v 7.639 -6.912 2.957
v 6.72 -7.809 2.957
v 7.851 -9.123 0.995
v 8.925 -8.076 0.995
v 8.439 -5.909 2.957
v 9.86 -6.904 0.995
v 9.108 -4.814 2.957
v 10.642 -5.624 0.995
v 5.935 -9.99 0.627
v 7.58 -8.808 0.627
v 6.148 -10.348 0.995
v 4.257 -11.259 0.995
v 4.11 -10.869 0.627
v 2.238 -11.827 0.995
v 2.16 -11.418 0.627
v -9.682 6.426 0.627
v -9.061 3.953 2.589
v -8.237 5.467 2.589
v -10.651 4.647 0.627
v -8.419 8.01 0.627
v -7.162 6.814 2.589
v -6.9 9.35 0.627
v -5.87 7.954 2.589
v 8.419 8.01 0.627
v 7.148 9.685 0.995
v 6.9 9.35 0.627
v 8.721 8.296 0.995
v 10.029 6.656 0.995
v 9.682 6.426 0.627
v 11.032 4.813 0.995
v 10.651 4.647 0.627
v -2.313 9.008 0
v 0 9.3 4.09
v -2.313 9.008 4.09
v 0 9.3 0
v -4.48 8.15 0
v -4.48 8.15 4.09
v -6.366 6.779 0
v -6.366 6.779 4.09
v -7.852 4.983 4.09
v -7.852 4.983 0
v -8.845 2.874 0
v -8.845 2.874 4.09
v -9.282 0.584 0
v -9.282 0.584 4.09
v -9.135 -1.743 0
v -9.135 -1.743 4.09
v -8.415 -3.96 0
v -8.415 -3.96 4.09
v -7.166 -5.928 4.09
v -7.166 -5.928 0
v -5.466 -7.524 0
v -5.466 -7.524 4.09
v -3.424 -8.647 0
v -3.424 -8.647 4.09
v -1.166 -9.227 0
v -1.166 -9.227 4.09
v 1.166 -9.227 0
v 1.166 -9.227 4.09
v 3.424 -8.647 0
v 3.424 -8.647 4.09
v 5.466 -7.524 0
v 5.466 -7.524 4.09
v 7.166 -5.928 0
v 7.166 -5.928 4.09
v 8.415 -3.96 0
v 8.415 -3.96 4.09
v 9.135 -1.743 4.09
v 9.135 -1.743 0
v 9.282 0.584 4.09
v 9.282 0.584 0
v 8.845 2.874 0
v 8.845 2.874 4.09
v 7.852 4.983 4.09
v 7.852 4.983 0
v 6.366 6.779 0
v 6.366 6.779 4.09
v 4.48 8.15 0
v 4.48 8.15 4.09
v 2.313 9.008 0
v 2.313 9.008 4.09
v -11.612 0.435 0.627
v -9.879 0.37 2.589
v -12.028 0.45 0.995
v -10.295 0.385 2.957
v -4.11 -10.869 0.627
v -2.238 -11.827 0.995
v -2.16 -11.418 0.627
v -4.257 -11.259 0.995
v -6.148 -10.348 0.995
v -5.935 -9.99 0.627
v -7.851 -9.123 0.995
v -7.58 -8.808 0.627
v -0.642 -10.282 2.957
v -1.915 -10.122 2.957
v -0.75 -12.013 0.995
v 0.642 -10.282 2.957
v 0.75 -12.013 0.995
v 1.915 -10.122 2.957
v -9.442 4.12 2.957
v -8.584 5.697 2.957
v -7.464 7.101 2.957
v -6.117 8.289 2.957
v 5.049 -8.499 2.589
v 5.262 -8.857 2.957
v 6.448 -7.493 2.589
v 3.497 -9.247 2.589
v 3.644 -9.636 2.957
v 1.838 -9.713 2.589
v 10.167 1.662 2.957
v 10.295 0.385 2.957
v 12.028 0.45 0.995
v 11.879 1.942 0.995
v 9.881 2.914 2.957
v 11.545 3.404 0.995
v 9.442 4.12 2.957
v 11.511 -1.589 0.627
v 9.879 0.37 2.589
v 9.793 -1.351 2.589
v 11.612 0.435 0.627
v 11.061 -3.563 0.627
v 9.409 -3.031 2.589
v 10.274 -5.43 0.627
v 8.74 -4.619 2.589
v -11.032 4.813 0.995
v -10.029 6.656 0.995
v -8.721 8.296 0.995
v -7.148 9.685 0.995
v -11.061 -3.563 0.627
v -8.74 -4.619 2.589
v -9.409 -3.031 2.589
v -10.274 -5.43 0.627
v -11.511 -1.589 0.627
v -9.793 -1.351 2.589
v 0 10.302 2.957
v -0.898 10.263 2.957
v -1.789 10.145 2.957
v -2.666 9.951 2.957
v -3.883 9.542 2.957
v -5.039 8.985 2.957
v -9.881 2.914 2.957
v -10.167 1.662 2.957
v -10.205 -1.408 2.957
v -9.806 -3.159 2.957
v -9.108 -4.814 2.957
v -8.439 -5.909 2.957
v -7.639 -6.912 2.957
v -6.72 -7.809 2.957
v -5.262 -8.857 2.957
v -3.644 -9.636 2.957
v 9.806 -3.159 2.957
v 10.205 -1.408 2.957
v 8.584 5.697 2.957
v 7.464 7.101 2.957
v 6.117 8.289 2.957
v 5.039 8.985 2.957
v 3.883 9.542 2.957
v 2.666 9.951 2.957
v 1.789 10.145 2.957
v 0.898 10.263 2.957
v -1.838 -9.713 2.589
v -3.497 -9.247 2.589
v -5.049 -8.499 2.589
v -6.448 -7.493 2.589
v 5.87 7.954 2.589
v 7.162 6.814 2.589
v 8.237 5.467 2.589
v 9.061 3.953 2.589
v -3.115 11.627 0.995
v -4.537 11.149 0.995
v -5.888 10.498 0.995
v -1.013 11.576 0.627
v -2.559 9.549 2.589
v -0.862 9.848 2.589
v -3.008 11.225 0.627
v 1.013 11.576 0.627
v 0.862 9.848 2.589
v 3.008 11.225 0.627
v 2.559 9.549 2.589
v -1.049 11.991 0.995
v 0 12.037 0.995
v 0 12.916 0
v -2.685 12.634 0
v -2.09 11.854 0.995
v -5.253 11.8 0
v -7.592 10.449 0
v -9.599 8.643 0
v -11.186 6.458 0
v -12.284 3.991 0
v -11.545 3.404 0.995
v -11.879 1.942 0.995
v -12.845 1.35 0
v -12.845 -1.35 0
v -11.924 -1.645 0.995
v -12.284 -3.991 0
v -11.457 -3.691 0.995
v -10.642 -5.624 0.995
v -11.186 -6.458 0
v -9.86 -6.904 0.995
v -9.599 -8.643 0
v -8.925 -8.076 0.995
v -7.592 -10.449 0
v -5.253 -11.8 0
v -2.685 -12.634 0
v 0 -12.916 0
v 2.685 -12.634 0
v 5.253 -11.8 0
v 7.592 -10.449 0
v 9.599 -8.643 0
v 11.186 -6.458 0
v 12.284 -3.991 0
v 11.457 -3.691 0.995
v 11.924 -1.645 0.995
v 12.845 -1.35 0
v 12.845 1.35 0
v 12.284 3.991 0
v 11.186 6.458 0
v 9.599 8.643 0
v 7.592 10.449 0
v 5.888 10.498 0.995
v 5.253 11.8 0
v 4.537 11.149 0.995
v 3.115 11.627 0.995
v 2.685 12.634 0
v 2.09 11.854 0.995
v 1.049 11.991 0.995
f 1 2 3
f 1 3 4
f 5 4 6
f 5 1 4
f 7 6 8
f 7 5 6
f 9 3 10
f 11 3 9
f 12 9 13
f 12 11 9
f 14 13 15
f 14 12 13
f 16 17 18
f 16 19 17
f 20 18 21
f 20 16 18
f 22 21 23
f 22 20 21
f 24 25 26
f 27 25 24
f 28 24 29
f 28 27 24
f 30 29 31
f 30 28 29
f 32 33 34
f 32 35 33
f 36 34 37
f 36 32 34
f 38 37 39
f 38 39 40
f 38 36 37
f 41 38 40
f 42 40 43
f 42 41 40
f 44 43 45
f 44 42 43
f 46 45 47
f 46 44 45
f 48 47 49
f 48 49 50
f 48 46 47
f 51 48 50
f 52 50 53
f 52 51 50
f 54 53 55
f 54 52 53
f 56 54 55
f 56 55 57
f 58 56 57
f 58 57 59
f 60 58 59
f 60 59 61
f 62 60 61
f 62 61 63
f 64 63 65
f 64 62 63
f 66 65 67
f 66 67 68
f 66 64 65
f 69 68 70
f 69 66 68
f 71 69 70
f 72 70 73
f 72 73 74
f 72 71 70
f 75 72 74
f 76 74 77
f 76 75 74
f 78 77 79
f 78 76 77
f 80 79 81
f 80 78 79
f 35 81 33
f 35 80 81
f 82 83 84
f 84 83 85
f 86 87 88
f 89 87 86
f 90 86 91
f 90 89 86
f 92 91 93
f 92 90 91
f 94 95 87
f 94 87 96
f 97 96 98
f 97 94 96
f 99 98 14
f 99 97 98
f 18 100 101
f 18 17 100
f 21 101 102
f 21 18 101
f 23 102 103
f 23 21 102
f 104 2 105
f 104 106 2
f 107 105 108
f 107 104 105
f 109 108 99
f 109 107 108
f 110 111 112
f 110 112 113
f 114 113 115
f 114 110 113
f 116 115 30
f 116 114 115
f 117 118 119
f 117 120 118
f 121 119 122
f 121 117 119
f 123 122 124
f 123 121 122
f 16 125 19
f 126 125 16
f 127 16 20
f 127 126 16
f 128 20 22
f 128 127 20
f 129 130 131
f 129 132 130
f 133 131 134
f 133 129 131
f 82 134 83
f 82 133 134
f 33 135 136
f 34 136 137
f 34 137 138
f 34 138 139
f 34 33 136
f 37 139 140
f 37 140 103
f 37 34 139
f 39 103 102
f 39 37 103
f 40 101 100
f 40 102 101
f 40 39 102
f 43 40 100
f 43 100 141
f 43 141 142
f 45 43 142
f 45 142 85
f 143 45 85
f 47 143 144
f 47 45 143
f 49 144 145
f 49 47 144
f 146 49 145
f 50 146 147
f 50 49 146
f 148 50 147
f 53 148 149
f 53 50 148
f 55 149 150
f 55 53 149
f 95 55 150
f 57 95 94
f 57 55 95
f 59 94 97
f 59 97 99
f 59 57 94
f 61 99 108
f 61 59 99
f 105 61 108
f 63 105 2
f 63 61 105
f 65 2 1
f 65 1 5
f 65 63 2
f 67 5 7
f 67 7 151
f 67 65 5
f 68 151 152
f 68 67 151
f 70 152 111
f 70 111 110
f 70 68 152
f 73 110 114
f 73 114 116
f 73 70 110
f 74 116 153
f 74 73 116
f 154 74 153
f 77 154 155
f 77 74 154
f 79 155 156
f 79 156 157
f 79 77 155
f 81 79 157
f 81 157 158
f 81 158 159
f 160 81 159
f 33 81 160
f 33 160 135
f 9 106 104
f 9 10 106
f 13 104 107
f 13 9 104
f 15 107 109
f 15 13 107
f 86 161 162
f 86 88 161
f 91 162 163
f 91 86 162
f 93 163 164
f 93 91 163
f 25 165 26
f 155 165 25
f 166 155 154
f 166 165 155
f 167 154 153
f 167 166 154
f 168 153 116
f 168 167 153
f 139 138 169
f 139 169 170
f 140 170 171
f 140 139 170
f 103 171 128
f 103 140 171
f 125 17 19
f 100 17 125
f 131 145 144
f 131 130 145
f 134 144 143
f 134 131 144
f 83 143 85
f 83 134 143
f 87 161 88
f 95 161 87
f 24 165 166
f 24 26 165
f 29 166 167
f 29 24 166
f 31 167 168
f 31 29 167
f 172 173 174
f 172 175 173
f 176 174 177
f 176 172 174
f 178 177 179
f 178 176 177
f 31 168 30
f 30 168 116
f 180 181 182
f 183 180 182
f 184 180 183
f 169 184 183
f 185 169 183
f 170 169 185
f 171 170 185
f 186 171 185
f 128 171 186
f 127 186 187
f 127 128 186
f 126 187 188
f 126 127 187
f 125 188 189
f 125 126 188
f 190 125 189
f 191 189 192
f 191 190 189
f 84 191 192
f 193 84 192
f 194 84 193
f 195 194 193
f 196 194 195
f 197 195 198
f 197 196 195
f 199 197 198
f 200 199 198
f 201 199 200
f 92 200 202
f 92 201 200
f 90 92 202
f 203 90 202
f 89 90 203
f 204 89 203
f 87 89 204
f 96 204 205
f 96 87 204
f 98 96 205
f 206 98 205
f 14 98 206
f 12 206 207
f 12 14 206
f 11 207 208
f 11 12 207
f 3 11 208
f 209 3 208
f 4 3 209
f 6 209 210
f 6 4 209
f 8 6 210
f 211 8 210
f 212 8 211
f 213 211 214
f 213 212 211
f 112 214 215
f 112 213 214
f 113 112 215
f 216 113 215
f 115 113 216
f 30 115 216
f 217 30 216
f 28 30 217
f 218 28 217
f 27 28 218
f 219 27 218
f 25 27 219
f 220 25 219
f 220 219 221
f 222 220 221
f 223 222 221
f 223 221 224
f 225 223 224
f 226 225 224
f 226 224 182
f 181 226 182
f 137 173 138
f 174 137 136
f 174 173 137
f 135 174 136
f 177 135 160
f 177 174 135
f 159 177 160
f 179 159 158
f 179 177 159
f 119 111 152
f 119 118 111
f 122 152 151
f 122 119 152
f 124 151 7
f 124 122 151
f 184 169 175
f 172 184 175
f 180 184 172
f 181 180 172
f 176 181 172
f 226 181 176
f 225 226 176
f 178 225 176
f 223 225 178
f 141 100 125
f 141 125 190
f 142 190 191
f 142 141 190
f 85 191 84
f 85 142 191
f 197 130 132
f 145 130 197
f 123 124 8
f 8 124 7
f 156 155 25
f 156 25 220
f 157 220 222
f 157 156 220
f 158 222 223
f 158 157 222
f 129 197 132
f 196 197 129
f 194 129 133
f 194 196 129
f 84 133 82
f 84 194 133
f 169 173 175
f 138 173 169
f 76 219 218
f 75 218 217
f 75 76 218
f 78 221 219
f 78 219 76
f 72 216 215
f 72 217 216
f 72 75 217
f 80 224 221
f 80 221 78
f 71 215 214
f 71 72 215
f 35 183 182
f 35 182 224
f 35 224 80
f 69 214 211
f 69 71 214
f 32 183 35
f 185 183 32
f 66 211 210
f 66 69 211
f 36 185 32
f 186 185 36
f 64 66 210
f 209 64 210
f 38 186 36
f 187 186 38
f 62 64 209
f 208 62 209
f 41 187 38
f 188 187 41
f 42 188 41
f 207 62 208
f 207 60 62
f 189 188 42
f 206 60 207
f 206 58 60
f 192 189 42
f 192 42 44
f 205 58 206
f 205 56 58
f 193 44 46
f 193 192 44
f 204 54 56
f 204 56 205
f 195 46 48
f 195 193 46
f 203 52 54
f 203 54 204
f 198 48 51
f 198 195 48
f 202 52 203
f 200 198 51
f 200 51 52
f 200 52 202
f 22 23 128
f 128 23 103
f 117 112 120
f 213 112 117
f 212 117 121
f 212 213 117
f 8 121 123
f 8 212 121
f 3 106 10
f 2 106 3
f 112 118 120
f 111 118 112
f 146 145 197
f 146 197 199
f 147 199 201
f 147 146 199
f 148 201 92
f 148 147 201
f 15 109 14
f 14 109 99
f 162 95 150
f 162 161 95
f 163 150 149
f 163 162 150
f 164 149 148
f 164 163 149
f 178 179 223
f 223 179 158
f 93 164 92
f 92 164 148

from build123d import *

# Parameters (mm, degrees)
F2_ANGLE_BACK   = 15
F2_ANGLE        = 30
F2_COPIES_COUNT = 7


# Not quite as in the source:
# - a pattern or mirror of a feature is missing from the dataset's text; its kind, count and spacing are read off the source's solid


with BuildPart() as f1:
    # F0 (on Right) → F1 (revolve)
    with BuildSketch(Plane.YZ):
        Polygon((9.3, 4.0896662887), (9.3, 0), (12.9161745474, 0), (12.0366714414, 0.9946627731), (11.620462189, 0.6266412283), (9.8856947209, 2.5885542775), (10.3019039734, 2.9565758223), align=None)
        Polygon((11.620462189, 0.6266412283), (12.0366714414, 0.9946627731), (10.3019039734, 2.9565758223), (9.8856947209, 2.5885542775), align=None)
    revolve(axis=Axis((0, 0, 2.1812447902), (0, 0, 1)))

    # F0 (on Right) → F2 (revolve, cut)
    with BuildSketch(Plane.YZ, mode=Mode.PRIVATE) as f2_sk:
        Polygon((11.620462189, 0.6266412283), (12.0366714414, 0.9946627731), (10.3019039734, 2.9565758223), (9.8856947209, 2.5885542775), align=None)
    f2 = revolve(f2_sk.sketch.rotate(Axis((0, 0, 2.1812447902), (0, 0, -1)), -F2_ANGLE_BACK), axis=Axis((0, 0, 2.1812447902), (0, 0, -1)), revolution_arc=F2_ANGLE, mode=Mode.SUBTRACT)

    # F2_copies: F2 ×7 about axis
    f2_copies_axis = Axis((0, 0, 0), (0, 0, 1))
    for i in range(1, F2_COPIES_COUNT):
        add(f2.rotate(f2_copies_axis, i * 360 / F2_COPIES_COUNT), mode=Mode.SUBTRACT)


solid = f1.part
